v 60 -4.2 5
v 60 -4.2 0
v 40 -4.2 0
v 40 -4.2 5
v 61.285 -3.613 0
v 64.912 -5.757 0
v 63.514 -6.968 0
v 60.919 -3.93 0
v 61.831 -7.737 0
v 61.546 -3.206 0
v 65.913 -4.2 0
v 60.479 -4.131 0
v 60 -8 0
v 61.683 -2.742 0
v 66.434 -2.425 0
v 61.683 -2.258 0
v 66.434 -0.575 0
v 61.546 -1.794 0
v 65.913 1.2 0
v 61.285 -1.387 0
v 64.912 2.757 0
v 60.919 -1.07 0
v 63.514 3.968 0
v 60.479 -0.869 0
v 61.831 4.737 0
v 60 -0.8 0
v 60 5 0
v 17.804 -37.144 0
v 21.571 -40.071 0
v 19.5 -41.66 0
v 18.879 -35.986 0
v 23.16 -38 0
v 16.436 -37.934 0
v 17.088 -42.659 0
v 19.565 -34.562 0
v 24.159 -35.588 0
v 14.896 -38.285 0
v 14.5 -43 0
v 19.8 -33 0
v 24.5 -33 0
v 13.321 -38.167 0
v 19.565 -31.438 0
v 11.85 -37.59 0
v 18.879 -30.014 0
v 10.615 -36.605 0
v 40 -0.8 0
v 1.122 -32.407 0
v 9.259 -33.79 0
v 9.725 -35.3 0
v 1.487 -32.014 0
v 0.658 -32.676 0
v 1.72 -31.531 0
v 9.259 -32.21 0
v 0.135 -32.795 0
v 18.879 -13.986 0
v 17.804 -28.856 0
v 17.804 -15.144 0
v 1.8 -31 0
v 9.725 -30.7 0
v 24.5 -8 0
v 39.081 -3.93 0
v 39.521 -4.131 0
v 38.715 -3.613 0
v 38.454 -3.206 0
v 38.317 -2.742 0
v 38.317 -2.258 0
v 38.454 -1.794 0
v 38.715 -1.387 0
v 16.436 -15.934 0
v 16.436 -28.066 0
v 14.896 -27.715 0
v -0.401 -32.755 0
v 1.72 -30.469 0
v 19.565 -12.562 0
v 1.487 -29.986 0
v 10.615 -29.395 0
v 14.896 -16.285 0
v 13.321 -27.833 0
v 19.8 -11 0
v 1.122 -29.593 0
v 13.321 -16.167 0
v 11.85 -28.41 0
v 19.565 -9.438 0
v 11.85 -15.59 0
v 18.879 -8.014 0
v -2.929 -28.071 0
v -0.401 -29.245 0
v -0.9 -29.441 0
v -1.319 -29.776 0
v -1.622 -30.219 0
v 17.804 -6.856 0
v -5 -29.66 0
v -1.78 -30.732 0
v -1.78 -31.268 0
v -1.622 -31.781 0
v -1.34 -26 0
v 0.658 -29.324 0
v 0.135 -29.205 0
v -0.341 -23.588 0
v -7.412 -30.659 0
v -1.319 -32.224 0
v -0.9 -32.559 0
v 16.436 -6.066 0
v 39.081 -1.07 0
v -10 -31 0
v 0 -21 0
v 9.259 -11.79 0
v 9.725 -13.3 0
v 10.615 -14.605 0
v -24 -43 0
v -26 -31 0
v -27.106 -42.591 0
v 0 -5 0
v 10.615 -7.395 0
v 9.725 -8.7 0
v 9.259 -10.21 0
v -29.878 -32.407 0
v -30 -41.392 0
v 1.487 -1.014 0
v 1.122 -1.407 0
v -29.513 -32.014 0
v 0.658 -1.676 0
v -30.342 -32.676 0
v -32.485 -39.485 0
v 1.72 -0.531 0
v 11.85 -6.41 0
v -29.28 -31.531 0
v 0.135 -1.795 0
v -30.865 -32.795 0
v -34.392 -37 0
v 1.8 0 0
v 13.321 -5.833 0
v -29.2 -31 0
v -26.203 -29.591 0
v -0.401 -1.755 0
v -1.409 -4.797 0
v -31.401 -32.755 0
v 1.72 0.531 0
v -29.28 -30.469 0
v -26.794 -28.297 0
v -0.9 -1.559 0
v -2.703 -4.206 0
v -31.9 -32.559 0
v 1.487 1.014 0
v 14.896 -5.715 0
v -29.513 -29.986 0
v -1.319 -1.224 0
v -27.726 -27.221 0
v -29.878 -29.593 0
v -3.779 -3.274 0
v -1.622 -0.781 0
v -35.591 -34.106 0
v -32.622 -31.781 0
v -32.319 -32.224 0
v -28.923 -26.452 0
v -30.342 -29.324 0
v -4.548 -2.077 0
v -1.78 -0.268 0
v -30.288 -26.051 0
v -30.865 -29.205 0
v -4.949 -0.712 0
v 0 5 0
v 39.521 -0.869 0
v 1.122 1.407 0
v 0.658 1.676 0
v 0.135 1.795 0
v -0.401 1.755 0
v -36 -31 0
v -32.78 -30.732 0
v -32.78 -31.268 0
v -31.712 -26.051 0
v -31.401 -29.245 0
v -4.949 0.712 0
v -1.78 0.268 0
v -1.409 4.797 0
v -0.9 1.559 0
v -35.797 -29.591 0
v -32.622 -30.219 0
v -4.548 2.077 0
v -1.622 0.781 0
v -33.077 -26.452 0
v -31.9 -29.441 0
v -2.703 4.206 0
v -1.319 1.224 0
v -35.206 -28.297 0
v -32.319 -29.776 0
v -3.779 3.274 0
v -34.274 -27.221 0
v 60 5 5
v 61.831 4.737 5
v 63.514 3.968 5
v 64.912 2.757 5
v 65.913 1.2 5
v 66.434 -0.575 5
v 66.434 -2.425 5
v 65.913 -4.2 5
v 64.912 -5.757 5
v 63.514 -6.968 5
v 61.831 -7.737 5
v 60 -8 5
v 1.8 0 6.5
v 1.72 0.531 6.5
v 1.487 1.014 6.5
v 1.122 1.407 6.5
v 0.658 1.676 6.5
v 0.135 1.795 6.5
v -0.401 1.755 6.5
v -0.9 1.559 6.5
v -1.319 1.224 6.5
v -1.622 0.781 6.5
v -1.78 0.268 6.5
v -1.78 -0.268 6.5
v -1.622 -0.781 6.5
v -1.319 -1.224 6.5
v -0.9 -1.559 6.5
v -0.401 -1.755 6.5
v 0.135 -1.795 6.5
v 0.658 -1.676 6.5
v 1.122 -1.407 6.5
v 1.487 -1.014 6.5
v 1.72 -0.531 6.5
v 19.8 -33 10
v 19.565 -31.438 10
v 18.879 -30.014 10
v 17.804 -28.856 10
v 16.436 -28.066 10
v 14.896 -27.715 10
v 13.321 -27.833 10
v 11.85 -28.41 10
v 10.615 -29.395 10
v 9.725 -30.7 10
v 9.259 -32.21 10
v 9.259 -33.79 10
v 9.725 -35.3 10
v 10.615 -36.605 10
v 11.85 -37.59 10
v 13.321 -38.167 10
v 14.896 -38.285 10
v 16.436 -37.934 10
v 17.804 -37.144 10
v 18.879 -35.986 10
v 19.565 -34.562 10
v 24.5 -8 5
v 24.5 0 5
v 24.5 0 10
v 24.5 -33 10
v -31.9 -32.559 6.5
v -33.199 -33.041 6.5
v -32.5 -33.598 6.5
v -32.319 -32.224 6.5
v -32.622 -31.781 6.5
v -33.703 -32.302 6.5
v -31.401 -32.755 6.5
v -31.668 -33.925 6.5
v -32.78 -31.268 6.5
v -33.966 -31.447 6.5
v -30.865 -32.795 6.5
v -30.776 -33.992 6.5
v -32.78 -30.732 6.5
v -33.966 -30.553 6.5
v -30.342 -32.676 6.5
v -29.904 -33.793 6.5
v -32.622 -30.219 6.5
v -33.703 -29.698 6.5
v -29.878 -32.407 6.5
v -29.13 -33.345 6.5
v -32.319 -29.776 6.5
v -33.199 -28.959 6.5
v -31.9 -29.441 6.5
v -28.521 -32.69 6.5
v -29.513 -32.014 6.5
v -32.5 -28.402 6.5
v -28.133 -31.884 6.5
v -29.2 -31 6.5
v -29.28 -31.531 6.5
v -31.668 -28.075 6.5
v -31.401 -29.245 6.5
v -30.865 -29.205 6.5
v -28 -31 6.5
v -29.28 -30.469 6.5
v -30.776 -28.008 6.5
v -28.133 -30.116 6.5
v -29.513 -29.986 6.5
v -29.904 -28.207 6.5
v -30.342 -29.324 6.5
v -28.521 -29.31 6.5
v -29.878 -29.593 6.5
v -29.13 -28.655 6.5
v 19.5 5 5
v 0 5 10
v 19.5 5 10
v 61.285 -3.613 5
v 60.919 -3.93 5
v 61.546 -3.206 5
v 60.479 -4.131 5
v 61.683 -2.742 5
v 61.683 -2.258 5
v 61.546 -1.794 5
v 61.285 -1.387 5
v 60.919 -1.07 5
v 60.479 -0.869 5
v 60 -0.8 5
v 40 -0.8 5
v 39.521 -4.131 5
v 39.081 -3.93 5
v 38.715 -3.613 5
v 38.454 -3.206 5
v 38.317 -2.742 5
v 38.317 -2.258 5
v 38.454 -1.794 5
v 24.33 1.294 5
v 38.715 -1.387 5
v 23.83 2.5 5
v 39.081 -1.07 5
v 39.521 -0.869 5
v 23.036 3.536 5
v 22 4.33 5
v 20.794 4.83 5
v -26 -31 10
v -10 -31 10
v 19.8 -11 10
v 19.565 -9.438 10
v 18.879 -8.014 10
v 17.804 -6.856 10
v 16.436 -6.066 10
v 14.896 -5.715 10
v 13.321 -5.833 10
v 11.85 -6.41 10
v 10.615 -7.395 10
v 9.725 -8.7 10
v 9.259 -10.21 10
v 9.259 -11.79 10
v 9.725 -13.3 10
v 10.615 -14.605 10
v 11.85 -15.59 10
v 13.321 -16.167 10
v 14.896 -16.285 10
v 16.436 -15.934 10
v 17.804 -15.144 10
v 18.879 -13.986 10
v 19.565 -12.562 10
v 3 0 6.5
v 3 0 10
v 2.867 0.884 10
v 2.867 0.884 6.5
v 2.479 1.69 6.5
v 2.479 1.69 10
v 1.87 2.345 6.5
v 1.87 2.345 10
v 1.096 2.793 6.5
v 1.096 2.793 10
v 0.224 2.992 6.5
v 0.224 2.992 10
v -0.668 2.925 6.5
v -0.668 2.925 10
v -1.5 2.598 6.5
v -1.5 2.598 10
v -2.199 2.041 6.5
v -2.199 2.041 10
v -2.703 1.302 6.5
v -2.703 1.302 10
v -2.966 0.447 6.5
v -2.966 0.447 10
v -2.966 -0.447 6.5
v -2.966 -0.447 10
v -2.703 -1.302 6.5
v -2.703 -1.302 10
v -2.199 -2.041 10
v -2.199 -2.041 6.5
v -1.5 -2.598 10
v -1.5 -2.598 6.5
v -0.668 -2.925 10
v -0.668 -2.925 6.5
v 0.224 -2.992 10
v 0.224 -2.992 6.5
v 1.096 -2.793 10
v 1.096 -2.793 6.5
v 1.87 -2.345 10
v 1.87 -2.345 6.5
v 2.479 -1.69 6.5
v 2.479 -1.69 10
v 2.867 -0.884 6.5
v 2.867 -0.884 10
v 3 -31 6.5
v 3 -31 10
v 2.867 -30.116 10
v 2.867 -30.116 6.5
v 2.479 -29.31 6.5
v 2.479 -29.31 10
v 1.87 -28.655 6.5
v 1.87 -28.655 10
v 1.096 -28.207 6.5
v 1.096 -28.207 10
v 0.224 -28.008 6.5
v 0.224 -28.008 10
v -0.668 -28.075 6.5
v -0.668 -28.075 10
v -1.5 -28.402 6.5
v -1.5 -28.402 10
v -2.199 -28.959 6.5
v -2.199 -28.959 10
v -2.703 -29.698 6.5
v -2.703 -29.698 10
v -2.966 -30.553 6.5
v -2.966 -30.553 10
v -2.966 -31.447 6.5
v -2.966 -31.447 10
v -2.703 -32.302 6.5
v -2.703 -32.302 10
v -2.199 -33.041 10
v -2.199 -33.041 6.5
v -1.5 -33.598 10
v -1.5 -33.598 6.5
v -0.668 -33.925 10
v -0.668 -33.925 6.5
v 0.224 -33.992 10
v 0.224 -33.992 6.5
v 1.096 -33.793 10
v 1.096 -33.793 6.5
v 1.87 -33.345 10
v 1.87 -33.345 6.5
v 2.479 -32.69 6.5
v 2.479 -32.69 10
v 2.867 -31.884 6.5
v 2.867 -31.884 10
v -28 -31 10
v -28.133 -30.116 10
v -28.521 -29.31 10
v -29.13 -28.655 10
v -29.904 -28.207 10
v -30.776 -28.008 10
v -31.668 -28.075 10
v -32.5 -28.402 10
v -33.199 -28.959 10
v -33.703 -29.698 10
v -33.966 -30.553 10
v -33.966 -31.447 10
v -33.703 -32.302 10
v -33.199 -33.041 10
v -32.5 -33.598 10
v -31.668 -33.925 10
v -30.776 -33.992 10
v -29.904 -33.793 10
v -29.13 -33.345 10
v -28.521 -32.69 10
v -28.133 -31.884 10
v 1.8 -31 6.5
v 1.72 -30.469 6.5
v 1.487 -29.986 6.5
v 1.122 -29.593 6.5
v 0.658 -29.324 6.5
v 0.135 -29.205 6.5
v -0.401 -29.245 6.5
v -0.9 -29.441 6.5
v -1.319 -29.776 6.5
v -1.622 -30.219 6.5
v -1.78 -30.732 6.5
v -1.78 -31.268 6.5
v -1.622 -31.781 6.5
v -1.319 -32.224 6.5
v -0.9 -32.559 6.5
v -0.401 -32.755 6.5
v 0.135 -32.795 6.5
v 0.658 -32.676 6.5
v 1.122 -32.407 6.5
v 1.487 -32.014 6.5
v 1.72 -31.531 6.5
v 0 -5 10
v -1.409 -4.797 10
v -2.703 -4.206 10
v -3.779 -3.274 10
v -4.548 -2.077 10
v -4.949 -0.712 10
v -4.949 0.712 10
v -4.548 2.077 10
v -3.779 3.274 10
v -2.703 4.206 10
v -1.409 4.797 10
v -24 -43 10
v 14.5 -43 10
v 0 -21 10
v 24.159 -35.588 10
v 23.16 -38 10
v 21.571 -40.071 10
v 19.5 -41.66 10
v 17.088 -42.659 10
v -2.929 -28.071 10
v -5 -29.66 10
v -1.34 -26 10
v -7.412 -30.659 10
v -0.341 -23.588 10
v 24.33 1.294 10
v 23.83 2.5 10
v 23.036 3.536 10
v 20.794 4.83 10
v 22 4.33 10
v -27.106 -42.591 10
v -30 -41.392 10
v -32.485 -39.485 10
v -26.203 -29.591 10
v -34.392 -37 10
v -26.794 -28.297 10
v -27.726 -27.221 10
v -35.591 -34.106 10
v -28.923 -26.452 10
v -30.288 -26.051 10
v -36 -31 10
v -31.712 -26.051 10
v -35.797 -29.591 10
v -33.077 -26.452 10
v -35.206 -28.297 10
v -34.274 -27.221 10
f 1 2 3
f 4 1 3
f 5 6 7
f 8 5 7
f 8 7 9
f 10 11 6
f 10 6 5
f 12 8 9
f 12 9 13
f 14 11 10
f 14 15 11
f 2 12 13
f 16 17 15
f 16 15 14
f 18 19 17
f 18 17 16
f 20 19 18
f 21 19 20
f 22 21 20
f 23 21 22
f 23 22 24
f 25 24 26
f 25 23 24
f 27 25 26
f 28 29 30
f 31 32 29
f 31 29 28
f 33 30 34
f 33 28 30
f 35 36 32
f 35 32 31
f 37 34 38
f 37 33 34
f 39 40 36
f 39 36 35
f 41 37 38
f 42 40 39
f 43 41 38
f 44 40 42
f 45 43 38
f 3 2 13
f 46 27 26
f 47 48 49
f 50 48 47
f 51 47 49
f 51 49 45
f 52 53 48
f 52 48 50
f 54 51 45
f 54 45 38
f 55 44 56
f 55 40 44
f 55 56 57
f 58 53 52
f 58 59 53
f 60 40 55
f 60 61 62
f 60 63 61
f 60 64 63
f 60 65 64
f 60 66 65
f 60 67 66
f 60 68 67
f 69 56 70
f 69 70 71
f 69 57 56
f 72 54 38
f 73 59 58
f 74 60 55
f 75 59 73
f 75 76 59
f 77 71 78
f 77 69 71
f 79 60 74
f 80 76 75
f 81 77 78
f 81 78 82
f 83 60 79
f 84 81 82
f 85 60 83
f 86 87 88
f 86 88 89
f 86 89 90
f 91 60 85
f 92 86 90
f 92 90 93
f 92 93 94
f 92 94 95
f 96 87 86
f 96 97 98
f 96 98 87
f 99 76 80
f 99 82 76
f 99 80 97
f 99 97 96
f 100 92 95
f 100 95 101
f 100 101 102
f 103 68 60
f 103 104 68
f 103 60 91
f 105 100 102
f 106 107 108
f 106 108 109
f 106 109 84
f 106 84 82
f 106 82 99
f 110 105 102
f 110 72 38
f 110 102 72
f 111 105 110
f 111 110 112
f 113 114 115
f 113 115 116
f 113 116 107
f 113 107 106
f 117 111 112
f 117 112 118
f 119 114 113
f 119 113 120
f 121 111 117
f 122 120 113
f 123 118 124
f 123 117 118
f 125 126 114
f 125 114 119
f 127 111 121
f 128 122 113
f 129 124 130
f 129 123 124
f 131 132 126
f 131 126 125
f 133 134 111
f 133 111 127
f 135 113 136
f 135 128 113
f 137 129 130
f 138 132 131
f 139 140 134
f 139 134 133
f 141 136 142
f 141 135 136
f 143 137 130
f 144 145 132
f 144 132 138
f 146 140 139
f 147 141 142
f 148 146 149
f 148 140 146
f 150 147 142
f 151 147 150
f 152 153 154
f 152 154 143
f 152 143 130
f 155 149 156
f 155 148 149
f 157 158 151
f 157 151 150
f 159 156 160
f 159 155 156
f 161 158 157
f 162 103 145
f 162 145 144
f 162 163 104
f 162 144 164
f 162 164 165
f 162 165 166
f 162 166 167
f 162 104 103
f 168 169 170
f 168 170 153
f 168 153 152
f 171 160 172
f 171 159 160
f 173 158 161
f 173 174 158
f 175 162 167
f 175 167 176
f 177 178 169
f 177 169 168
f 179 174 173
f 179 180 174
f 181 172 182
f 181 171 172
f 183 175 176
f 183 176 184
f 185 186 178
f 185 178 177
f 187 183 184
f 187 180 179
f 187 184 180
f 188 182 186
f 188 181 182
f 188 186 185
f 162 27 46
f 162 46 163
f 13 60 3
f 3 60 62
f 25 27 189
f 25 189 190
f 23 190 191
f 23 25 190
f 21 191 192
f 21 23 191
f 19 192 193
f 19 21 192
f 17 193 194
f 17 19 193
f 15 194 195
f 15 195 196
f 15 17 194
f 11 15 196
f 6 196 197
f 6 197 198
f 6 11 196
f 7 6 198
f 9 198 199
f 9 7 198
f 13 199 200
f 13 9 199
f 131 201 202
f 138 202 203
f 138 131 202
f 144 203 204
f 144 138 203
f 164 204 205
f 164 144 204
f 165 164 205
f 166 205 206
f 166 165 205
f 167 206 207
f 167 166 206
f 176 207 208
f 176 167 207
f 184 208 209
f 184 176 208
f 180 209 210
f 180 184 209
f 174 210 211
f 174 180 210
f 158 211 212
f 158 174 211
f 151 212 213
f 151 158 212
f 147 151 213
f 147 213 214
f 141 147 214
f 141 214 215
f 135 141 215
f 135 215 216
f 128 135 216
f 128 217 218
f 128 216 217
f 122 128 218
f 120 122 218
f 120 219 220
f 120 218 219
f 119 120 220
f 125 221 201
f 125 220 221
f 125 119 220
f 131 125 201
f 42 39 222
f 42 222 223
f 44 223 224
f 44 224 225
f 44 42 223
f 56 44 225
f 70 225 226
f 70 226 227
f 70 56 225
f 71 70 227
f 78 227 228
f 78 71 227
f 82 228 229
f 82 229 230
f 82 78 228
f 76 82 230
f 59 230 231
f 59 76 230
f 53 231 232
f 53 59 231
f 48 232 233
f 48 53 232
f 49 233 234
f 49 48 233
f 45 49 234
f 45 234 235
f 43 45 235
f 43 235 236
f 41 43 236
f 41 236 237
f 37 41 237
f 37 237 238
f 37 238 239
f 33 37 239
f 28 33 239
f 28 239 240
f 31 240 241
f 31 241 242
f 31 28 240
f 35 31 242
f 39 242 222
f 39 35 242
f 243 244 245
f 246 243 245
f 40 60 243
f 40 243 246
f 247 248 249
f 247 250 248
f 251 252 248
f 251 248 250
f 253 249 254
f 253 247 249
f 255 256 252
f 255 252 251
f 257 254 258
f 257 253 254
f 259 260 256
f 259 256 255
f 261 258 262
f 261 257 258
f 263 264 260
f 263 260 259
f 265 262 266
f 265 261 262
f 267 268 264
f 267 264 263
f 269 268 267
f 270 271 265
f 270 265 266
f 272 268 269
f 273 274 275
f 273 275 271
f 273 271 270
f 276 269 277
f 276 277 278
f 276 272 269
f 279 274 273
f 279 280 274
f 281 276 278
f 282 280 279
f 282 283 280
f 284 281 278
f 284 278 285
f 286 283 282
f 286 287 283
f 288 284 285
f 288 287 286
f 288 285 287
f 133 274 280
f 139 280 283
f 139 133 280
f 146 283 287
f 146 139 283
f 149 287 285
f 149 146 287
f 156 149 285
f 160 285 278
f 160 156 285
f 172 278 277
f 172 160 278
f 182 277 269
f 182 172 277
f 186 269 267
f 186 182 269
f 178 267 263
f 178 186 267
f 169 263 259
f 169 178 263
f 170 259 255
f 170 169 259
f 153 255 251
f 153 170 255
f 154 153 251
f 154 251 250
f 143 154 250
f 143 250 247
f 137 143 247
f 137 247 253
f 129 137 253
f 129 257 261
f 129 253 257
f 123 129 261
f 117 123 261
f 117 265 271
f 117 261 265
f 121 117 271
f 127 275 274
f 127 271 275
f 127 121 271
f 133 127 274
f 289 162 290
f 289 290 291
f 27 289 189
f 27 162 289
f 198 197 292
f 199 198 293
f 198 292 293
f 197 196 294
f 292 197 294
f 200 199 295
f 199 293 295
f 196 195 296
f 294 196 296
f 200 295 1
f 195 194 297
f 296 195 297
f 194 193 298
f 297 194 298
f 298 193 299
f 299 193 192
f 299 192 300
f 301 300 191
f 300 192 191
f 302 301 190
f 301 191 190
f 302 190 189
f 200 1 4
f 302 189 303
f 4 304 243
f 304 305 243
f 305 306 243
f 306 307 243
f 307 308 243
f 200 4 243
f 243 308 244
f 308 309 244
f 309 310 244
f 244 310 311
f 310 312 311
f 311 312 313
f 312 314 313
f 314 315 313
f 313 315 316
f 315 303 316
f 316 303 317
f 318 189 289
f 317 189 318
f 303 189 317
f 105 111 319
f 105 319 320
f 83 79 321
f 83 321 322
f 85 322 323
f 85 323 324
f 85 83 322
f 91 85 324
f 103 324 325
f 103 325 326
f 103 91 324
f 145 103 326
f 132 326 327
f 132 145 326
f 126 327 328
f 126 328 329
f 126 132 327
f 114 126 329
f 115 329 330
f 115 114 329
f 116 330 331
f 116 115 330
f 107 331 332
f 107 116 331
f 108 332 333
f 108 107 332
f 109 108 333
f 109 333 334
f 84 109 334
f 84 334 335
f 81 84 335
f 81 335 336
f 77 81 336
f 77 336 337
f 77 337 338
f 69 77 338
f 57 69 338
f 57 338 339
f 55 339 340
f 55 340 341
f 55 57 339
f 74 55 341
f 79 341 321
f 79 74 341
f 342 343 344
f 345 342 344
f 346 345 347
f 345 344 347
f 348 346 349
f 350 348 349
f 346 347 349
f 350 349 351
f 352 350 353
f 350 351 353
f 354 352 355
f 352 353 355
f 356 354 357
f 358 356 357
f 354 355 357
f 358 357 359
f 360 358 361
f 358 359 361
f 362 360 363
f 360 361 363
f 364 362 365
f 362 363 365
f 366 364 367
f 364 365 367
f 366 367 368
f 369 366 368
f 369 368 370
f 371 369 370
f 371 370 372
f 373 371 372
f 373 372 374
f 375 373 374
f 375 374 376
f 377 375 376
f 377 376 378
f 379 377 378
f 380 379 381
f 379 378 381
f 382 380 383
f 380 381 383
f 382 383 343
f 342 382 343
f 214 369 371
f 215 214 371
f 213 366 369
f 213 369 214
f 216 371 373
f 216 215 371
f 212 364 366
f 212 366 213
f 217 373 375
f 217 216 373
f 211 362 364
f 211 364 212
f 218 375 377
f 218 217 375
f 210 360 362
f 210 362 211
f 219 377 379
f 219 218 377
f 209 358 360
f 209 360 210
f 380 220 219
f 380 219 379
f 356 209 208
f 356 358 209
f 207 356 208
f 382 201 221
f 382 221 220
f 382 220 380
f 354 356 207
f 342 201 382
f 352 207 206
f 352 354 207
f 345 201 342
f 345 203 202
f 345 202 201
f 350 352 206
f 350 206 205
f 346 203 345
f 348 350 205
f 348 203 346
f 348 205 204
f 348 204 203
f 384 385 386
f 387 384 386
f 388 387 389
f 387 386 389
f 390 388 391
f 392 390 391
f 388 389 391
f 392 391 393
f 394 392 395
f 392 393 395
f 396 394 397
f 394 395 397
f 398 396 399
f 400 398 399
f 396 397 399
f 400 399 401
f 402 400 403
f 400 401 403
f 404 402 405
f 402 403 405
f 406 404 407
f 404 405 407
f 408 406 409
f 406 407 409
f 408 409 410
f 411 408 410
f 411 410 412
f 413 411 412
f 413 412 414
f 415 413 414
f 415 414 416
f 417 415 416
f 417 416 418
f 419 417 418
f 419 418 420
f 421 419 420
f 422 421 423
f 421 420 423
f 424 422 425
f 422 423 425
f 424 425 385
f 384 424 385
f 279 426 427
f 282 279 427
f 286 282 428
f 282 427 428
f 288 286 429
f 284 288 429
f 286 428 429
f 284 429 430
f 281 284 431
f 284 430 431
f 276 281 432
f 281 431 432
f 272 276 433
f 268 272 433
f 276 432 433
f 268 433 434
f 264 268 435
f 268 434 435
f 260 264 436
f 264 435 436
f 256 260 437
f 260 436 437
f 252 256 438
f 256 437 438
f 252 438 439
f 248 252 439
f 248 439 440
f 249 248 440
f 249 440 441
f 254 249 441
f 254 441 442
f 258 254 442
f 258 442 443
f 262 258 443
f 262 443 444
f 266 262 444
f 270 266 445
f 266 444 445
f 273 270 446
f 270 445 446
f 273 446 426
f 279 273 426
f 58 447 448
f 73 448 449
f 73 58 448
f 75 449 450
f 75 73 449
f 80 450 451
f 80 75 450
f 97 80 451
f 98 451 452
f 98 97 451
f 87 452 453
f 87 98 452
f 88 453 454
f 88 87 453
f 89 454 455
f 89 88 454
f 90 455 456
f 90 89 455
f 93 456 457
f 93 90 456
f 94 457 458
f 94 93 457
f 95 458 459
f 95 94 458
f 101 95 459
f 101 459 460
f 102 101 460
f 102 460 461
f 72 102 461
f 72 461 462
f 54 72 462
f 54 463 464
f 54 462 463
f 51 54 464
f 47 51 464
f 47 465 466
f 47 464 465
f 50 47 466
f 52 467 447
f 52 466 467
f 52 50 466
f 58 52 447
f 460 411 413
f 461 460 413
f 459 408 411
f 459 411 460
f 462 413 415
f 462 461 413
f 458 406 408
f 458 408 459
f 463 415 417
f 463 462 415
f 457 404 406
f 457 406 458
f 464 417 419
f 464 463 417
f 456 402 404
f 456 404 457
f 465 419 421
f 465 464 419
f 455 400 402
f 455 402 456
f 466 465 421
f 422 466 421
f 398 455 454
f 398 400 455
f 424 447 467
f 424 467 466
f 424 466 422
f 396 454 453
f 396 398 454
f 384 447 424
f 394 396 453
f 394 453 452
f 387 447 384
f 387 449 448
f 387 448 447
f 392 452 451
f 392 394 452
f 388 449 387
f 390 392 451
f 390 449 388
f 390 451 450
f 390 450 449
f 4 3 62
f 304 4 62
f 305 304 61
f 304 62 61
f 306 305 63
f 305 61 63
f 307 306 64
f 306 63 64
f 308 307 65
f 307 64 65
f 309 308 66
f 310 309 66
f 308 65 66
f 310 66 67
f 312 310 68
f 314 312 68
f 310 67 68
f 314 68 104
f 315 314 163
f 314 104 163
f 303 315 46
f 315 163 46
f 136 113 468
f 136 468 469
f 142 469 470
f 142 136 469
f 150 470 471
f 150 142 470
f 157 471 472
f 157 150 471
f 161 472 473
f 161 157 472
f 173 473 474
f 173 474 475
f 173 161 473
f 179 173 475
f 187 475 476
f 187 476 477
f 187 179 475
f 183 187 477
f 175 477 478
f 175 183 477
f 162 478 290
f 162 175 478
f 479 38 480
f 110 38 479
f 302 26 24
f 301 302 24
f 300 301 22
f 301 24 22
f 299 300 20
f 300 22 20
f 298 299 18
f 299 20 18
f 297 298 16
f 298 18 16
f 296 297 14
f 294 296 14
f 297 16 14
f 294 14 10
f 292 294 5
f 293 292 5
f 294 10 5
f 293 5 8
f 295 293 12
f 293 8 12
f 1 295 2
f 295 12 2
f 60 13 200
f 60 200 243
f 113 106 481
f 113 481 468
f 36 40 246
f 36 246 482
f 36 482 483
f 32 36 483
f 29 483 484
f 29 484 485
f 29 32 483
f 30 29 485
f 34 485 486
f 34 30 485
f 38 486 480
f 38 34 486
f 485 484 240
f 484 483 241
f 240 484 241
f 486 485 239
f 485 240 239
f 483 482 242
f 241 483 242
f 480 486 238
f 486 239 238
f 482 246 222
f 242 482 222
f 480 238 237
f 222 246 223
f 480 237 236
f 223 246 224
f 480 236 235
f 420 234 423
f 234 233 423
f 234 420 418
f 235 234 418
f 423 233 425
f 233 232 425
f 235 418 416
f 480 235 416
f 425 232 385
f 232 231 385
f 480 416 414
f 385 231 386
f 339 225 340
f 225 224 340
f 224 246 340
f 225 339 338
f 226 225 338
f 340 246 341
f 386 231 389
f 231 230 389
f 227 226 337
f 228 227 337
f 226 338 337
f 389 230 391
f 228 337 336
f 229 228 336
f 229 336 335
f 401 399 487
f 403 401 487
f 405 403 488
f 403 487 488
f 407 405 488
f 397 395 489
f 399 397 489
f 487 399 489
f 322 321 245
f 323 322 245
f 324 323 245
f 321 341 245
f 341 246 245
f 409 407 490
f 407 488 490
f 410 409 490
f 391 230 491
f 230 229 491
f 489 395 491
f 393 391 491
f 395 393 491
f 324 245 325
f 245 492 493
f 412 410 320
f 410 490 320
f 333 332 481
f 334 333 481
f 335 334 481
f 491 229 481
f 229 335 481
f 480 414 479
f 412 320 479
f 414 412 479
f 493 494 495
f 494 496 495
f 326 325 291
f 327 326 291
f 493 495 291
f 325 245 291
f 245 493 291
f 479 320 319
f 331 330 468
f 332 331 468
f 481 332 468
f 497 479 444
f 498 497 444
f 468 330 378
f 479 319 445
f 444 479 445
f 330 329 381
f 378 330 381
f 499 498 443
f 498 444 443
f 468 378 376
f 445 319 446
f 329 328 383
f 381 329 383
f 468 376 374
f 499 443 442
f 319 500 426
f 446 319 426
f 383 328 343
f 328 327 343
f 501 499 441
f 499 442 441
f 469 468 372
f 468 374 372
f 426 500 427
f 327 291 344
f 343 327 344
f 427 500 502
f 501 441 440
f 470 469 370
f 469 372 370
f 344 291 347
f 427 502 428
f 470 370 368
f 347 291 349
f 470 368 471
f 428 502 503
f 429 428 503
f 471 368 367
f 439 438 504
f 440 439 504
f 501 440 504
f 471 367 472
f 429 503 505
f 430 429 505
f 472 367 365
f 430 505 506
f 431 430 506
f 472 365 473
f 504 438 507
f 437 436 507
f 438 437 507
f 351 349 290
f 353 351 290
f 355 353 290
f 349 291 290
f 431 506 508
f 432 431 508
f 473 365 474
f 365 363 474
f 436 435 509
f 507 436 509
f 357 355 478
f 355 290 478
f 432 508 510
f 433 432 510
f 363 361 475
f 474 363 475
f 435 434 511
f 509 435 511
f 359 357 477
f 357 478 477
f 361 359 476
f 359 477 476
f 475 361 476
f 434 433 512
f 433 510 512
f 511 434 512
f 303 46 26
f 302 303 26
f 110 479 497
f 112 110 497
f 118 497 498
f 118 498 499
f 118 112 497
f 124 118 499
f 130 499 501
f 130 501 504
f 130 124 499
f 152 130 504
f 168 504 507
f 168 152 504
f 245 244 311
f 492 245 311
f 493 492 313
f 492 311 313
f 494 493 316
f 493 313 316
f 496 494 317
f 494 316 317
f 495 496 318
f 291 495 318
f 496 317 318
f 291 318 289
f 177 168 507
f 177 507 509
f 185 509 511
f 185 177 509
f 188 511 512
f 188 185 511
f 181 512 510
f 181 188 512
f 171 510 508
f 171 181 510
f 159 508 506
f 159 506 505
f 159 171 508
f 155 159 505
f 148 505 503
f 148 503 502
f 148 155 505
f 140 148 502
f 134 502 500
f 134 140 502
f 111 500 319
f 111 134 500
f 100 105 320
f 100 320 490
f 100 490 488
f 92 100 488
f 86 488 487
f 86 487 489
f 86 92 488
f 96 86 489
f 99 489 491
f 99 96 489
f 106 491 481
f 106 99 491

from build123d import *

# Parameters (mm, degrees)
SKETCH1_R           = 1.8
SKETCH1_R_2         = 5.3
BOSS_EXTRUDE1_DEPTH = 10
SKETCH2_R           = 3
CUT_EXTRUDE1_DEPTH  = 3.5
CUT_EXTRUDE2_START  = -5
CUT_EXTRUDE2_DEPTH  = 5


with BuildPart() as part:
    # Sketch1 → Boss-Extrude1 (new body)
    with BuildSketch(Plane.XY):
        with BuildLine():
            Line((0, 5), (60, 5))
            ThreePointArc((60, 5), (66.5, -1.5), (60, -8))
            Line((60, -8), (24.5, -8))
            Line((24.5, -8), (24.5, -33))
            ThreePointArc((24.5, -33), (21.571067812, -40.071067812), (14.5, -43))
            Line((14.5, -43), (-24, -43))
            ThreePointArc((-24, -43), (-32.485281374, -39.485281374), (-36, -31))
            ThreePointArc((-36, -31), (-31, -26), (-26, -31))
            Line((-26, -31), (-10, -31))
            ThreePointArc((-10, -31), (-2.928932188, -28.071067812), (0, -21))
            Line((0, -21), (0, -5))
            ThreePointArc((0, -5), (-5, 0), (0, 5))
        make_face()
        Circle(SKETCH1_R, mode=Mode.SUBTRACT)
        with Locations((14.5, -33)):
            Circle(SKETCH1_R_2, mode=Mode.SUBTRACT)
        with Locations((14.5, -11)):
            Circle(SKETCH1_R_2, mode=Mode.SUBTRACT)
        with Locations((0, -31)):
            Circle(SKETCH1_R, mode=Mode.SUBTRACT)
        with Locations((-31, -31)):
            Circle(SKETCH1_R, mode=Mode.SUBTRACT)
        with BuildLine():
            Line((60, -4.2), (40, -4.2))
            ThreePointArc((40, -4.2), (38.3, -2.5), (40, -0.8))
            Line((40, -0.8), (60, -0.8))
            ThreePointArc((60, -0.8), (61.7, -2.5), (60, -4.2))
        make_face(mode=Mode.SUBTRACT)
    extrude(amount=BOSS_EXTRUDE1_DEPTH)

    # Sketch2 → Cut-Extrude1 (cut)
    with BuildSketch(Plane.XY.offset(10)):
        with Locations((-31, -31)):
            Circle(SKETCH2_R)
        with Locations((0, -31)):
            Circle(SKETCH2_R)
        Circle(SKETCH2_R)
    extrude(amount=-CUT_EXTRUDE1_DEPTH, mode=Mode.SUBTRACT)

    # Sketch3 → Cut-Extrude2 (cut)
    with BuildSketch(Plane.XY.offset(10).offset(CUT_EXTRUDE2_START)):
        with BuildLine():
            Line((24.5, -8), (24.5, 0))
            ThreePointArc((24.5, 0), (23.035533906, 3.535533906), (19.5, 5))
            Line((19.5, 5), (60, 5))
            ThreePointArc((60, 5), (66.5, -1.5), (60, -8))
            Line((60, -8), (24.5, -8))
        make_face()
    extrude(amount=CUT_EXTRUDE2_DEPTH, mode=Mode.SUBTRACT)


solid = part.part
